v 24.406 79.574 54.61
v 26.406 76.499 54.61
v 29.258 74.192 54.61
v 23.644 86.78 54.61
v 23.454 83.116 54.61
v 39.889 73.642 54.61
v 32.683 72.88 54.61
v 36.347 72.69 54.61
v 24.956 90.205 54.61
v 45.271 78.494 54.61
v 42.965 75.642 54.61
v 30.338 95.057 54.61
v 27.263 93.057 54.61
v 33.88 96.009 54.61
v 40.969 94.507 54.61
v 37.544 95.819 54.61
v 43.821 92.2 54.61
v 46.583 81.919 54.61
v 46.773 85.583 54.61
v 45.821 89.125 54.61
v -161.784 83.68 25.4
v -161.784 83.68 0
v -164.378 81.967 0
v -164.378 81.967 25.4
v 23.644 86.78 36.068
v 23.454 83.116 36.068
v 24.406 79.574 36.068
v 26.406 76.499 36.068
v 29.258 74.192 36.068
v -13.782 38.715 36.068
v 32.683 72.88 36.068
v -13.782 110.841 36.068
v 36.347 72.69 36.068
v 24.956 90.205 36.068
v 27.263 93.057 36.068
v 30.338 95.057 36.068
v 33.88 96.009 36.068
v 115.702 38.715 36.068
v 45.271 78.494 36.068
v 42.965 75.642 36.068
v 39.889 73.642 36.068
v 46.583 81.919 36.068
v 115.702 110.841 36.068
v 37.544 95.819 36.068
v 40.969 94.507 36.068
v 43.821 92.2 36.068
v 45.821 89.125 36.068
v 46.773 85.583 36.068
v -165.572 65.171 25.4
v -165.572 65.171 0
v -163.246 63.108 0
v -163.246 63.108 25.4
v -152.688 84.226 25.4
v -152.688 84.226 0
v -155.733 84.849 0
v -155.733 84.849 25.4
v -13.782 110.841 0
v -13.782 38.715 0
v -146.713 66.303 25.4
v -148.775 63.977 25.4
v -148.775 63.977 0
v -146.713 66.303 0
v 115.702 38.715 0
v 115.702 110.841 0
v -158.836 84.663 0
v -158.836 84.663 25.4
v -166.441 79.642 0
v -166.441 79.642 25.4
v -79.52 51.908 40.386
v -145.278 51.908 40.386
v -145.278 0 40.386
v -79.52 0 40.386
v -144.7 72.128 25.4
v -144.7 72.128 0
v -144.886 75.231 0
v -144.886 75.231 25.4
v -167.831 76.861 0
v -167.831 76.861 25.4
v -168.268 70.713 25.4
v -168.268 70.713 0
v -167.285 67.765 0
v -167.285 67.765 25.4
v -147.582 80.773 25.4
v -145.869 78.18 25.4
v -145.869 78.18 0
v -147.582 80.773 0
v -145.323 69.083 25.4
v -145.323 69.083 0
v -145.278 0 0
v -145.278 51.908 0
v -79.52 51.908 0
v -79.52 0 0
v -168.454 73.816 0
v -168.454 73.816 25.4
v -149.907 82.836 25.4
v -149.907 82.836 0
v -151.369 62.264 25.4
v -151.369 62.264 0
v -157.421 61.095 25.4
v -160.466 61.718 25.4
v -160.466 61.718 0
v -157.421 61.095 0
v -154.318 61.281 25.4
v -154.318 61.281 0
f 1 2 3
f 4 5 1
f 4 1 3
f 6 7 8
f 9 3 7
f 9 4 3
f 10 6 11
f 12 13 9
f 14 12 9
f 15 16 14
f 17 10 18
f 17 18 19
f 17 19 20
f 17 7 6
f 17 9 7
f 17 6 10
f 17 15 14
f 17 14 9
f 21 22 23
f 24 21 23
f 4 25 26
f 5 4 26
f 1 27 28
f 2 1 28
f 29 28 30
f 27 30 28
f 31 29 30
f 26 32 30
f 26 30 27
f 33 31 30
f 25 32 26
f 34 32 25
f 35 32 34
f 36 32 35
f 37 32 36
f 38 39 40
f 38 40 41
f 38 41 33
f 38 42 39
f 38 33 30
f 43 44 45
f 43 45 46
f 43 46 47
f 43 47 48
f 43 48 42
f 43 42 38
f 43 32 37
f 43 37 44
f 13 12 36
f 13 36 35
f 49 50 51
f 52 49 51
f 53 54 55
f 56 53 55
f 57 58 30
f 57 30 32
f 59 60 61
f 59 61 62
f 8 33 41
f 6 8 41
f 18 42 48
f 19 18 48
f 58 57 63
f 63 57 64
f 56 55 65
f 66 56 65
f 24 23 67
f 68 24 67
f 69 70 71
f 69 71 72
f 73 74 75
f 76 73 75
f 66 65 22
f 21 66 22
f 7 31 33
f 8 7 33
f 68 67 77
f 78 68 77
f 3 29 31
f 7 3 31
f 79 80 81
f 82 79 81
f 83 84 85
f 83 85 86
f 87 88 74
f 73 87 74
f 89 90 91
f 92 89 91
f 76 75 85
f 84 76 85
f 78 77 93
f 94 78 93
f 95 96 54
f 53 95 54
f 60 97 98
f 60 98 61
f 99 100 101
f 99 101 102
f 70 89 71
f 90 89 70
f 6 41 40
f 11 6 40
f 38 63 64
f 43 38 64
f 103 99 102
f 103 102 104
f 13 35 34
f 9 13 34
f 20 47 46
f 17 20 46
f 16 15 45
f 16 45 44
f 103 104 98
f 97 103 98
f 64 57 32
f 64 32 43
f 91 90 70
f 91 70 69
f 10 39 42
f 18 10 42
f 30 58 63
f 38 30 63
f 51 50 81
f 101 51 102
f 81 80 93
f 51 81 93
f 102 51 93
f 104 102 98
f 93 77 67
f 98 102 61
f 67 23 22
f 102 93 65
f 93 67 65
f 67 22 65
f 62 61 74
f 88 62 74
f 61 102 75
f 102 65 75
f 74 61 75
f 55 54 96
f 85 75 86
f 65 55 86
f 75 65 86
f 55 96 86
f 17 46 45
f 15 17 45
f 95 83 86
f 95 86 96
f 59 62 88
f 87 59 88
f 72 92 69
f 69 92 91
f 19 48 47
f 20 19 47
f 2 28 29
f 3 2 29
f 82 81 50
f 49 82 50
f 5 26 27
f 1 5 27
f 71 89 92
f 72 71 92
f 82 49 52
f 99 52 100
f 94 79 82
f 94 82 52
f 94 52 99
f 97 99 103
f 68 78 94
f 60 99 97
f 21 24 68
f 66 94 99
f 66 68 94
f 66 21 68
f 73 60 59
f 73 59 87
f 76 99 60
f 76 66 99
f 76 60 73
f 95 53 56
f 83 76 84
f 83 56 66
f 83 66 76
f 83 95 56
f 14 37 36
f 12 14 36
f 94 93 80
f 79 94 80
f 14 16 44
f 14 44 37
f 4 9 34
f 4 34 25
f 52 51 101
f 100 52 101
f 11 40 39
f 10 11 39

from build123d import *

# Parameters (mm, degrees)
F0_W     = 65.757632
F0_H     = 51.907856
F1_DEPTH = 40.386
F3_DEPTH = 25.4
F5_DEPTH = 54.61
F6_W     = 129.483937
F6_H     = 72.125848
F7_DEPTH = 36.068


with BuildPart() as f1:
    # F0 (on Top) → F1 (new body)
    with BuildSketch(Plane.XY):
        with Locations((-112.398729, 25.953928)):
            Rectangle(F0_W, F0_H)
    extrude(amount=F1_DEPTH)


with BuildPart() as f3:
    # F2 (on Top) → F3 (new body)
    with BuildSketch(Plane.XY):
        Polygon((-148.775396, 63.976901), (-146.713111, 66.302566), (-145.323023, 69.082744), (-144.699865, 72.127971), (-144.886103, 75.23072), (-145.869045, 78.179543), (-147.581706, 80.773483), (-149.907371, 82.835768), (-152.687549, 84.225856), (-155.732776, 84.849014), (-158.835525, 84.662776), (-161.784348, 83.679834), (-164.378289, 81.967173), (-166.440573, 79.641508), (-167.830661, 76.86133), (-168.453819, 73.816103), (-168.267582, 70.713354), (-167.284639, 67.764531), (-165.571978, 65.17059), (-163.246313, 63.108306), (-160.466135, 61.718218), (-157.420908, 61.09506), (-154.318159, 61.281297), (-151.369336, 62.26424), align=None)
    extrude(amount=F3_DEPTH)


with BuildPart() as f5:
    # F4 (on Top) → F5 (new body)
    with BuildSketch(Plane.XY):
        Polygon((42.964521, 75.64168), (45.271141, 78.493935), (46.583472, 81.919375), (46.773054, 85.582694), (45.821329, 89.125302), (43.821458, 92.200423), (40.969204, 94.507043), (37.543764, 95.819375), (33.880444, 96.008956), (30.337836, 95.057231), (27.262715, 93.057361), (24.956095, 90.205106), (23.643764, 86.779666), (23.454182, 83.116347), (24.405907, 79.573739), (26.405777, 76.498618), (29.258032, 74.191998), (32.683472, 72.879667), (36.346791, 72.690085), (39.889399, 73.64181), align=None)
    extrude(amount=F5_DEPTH)

    # F6 (on Top) → F7 (join)
    with BuildSketch(Plane.XY):
        with Locations((50.95999, 74.777985)):
            Rectangle(F6_W, F6_H)
    extrude(amount=F7_DEPTH)


solid = Compound([f1.part, f3.part, f5.part])
